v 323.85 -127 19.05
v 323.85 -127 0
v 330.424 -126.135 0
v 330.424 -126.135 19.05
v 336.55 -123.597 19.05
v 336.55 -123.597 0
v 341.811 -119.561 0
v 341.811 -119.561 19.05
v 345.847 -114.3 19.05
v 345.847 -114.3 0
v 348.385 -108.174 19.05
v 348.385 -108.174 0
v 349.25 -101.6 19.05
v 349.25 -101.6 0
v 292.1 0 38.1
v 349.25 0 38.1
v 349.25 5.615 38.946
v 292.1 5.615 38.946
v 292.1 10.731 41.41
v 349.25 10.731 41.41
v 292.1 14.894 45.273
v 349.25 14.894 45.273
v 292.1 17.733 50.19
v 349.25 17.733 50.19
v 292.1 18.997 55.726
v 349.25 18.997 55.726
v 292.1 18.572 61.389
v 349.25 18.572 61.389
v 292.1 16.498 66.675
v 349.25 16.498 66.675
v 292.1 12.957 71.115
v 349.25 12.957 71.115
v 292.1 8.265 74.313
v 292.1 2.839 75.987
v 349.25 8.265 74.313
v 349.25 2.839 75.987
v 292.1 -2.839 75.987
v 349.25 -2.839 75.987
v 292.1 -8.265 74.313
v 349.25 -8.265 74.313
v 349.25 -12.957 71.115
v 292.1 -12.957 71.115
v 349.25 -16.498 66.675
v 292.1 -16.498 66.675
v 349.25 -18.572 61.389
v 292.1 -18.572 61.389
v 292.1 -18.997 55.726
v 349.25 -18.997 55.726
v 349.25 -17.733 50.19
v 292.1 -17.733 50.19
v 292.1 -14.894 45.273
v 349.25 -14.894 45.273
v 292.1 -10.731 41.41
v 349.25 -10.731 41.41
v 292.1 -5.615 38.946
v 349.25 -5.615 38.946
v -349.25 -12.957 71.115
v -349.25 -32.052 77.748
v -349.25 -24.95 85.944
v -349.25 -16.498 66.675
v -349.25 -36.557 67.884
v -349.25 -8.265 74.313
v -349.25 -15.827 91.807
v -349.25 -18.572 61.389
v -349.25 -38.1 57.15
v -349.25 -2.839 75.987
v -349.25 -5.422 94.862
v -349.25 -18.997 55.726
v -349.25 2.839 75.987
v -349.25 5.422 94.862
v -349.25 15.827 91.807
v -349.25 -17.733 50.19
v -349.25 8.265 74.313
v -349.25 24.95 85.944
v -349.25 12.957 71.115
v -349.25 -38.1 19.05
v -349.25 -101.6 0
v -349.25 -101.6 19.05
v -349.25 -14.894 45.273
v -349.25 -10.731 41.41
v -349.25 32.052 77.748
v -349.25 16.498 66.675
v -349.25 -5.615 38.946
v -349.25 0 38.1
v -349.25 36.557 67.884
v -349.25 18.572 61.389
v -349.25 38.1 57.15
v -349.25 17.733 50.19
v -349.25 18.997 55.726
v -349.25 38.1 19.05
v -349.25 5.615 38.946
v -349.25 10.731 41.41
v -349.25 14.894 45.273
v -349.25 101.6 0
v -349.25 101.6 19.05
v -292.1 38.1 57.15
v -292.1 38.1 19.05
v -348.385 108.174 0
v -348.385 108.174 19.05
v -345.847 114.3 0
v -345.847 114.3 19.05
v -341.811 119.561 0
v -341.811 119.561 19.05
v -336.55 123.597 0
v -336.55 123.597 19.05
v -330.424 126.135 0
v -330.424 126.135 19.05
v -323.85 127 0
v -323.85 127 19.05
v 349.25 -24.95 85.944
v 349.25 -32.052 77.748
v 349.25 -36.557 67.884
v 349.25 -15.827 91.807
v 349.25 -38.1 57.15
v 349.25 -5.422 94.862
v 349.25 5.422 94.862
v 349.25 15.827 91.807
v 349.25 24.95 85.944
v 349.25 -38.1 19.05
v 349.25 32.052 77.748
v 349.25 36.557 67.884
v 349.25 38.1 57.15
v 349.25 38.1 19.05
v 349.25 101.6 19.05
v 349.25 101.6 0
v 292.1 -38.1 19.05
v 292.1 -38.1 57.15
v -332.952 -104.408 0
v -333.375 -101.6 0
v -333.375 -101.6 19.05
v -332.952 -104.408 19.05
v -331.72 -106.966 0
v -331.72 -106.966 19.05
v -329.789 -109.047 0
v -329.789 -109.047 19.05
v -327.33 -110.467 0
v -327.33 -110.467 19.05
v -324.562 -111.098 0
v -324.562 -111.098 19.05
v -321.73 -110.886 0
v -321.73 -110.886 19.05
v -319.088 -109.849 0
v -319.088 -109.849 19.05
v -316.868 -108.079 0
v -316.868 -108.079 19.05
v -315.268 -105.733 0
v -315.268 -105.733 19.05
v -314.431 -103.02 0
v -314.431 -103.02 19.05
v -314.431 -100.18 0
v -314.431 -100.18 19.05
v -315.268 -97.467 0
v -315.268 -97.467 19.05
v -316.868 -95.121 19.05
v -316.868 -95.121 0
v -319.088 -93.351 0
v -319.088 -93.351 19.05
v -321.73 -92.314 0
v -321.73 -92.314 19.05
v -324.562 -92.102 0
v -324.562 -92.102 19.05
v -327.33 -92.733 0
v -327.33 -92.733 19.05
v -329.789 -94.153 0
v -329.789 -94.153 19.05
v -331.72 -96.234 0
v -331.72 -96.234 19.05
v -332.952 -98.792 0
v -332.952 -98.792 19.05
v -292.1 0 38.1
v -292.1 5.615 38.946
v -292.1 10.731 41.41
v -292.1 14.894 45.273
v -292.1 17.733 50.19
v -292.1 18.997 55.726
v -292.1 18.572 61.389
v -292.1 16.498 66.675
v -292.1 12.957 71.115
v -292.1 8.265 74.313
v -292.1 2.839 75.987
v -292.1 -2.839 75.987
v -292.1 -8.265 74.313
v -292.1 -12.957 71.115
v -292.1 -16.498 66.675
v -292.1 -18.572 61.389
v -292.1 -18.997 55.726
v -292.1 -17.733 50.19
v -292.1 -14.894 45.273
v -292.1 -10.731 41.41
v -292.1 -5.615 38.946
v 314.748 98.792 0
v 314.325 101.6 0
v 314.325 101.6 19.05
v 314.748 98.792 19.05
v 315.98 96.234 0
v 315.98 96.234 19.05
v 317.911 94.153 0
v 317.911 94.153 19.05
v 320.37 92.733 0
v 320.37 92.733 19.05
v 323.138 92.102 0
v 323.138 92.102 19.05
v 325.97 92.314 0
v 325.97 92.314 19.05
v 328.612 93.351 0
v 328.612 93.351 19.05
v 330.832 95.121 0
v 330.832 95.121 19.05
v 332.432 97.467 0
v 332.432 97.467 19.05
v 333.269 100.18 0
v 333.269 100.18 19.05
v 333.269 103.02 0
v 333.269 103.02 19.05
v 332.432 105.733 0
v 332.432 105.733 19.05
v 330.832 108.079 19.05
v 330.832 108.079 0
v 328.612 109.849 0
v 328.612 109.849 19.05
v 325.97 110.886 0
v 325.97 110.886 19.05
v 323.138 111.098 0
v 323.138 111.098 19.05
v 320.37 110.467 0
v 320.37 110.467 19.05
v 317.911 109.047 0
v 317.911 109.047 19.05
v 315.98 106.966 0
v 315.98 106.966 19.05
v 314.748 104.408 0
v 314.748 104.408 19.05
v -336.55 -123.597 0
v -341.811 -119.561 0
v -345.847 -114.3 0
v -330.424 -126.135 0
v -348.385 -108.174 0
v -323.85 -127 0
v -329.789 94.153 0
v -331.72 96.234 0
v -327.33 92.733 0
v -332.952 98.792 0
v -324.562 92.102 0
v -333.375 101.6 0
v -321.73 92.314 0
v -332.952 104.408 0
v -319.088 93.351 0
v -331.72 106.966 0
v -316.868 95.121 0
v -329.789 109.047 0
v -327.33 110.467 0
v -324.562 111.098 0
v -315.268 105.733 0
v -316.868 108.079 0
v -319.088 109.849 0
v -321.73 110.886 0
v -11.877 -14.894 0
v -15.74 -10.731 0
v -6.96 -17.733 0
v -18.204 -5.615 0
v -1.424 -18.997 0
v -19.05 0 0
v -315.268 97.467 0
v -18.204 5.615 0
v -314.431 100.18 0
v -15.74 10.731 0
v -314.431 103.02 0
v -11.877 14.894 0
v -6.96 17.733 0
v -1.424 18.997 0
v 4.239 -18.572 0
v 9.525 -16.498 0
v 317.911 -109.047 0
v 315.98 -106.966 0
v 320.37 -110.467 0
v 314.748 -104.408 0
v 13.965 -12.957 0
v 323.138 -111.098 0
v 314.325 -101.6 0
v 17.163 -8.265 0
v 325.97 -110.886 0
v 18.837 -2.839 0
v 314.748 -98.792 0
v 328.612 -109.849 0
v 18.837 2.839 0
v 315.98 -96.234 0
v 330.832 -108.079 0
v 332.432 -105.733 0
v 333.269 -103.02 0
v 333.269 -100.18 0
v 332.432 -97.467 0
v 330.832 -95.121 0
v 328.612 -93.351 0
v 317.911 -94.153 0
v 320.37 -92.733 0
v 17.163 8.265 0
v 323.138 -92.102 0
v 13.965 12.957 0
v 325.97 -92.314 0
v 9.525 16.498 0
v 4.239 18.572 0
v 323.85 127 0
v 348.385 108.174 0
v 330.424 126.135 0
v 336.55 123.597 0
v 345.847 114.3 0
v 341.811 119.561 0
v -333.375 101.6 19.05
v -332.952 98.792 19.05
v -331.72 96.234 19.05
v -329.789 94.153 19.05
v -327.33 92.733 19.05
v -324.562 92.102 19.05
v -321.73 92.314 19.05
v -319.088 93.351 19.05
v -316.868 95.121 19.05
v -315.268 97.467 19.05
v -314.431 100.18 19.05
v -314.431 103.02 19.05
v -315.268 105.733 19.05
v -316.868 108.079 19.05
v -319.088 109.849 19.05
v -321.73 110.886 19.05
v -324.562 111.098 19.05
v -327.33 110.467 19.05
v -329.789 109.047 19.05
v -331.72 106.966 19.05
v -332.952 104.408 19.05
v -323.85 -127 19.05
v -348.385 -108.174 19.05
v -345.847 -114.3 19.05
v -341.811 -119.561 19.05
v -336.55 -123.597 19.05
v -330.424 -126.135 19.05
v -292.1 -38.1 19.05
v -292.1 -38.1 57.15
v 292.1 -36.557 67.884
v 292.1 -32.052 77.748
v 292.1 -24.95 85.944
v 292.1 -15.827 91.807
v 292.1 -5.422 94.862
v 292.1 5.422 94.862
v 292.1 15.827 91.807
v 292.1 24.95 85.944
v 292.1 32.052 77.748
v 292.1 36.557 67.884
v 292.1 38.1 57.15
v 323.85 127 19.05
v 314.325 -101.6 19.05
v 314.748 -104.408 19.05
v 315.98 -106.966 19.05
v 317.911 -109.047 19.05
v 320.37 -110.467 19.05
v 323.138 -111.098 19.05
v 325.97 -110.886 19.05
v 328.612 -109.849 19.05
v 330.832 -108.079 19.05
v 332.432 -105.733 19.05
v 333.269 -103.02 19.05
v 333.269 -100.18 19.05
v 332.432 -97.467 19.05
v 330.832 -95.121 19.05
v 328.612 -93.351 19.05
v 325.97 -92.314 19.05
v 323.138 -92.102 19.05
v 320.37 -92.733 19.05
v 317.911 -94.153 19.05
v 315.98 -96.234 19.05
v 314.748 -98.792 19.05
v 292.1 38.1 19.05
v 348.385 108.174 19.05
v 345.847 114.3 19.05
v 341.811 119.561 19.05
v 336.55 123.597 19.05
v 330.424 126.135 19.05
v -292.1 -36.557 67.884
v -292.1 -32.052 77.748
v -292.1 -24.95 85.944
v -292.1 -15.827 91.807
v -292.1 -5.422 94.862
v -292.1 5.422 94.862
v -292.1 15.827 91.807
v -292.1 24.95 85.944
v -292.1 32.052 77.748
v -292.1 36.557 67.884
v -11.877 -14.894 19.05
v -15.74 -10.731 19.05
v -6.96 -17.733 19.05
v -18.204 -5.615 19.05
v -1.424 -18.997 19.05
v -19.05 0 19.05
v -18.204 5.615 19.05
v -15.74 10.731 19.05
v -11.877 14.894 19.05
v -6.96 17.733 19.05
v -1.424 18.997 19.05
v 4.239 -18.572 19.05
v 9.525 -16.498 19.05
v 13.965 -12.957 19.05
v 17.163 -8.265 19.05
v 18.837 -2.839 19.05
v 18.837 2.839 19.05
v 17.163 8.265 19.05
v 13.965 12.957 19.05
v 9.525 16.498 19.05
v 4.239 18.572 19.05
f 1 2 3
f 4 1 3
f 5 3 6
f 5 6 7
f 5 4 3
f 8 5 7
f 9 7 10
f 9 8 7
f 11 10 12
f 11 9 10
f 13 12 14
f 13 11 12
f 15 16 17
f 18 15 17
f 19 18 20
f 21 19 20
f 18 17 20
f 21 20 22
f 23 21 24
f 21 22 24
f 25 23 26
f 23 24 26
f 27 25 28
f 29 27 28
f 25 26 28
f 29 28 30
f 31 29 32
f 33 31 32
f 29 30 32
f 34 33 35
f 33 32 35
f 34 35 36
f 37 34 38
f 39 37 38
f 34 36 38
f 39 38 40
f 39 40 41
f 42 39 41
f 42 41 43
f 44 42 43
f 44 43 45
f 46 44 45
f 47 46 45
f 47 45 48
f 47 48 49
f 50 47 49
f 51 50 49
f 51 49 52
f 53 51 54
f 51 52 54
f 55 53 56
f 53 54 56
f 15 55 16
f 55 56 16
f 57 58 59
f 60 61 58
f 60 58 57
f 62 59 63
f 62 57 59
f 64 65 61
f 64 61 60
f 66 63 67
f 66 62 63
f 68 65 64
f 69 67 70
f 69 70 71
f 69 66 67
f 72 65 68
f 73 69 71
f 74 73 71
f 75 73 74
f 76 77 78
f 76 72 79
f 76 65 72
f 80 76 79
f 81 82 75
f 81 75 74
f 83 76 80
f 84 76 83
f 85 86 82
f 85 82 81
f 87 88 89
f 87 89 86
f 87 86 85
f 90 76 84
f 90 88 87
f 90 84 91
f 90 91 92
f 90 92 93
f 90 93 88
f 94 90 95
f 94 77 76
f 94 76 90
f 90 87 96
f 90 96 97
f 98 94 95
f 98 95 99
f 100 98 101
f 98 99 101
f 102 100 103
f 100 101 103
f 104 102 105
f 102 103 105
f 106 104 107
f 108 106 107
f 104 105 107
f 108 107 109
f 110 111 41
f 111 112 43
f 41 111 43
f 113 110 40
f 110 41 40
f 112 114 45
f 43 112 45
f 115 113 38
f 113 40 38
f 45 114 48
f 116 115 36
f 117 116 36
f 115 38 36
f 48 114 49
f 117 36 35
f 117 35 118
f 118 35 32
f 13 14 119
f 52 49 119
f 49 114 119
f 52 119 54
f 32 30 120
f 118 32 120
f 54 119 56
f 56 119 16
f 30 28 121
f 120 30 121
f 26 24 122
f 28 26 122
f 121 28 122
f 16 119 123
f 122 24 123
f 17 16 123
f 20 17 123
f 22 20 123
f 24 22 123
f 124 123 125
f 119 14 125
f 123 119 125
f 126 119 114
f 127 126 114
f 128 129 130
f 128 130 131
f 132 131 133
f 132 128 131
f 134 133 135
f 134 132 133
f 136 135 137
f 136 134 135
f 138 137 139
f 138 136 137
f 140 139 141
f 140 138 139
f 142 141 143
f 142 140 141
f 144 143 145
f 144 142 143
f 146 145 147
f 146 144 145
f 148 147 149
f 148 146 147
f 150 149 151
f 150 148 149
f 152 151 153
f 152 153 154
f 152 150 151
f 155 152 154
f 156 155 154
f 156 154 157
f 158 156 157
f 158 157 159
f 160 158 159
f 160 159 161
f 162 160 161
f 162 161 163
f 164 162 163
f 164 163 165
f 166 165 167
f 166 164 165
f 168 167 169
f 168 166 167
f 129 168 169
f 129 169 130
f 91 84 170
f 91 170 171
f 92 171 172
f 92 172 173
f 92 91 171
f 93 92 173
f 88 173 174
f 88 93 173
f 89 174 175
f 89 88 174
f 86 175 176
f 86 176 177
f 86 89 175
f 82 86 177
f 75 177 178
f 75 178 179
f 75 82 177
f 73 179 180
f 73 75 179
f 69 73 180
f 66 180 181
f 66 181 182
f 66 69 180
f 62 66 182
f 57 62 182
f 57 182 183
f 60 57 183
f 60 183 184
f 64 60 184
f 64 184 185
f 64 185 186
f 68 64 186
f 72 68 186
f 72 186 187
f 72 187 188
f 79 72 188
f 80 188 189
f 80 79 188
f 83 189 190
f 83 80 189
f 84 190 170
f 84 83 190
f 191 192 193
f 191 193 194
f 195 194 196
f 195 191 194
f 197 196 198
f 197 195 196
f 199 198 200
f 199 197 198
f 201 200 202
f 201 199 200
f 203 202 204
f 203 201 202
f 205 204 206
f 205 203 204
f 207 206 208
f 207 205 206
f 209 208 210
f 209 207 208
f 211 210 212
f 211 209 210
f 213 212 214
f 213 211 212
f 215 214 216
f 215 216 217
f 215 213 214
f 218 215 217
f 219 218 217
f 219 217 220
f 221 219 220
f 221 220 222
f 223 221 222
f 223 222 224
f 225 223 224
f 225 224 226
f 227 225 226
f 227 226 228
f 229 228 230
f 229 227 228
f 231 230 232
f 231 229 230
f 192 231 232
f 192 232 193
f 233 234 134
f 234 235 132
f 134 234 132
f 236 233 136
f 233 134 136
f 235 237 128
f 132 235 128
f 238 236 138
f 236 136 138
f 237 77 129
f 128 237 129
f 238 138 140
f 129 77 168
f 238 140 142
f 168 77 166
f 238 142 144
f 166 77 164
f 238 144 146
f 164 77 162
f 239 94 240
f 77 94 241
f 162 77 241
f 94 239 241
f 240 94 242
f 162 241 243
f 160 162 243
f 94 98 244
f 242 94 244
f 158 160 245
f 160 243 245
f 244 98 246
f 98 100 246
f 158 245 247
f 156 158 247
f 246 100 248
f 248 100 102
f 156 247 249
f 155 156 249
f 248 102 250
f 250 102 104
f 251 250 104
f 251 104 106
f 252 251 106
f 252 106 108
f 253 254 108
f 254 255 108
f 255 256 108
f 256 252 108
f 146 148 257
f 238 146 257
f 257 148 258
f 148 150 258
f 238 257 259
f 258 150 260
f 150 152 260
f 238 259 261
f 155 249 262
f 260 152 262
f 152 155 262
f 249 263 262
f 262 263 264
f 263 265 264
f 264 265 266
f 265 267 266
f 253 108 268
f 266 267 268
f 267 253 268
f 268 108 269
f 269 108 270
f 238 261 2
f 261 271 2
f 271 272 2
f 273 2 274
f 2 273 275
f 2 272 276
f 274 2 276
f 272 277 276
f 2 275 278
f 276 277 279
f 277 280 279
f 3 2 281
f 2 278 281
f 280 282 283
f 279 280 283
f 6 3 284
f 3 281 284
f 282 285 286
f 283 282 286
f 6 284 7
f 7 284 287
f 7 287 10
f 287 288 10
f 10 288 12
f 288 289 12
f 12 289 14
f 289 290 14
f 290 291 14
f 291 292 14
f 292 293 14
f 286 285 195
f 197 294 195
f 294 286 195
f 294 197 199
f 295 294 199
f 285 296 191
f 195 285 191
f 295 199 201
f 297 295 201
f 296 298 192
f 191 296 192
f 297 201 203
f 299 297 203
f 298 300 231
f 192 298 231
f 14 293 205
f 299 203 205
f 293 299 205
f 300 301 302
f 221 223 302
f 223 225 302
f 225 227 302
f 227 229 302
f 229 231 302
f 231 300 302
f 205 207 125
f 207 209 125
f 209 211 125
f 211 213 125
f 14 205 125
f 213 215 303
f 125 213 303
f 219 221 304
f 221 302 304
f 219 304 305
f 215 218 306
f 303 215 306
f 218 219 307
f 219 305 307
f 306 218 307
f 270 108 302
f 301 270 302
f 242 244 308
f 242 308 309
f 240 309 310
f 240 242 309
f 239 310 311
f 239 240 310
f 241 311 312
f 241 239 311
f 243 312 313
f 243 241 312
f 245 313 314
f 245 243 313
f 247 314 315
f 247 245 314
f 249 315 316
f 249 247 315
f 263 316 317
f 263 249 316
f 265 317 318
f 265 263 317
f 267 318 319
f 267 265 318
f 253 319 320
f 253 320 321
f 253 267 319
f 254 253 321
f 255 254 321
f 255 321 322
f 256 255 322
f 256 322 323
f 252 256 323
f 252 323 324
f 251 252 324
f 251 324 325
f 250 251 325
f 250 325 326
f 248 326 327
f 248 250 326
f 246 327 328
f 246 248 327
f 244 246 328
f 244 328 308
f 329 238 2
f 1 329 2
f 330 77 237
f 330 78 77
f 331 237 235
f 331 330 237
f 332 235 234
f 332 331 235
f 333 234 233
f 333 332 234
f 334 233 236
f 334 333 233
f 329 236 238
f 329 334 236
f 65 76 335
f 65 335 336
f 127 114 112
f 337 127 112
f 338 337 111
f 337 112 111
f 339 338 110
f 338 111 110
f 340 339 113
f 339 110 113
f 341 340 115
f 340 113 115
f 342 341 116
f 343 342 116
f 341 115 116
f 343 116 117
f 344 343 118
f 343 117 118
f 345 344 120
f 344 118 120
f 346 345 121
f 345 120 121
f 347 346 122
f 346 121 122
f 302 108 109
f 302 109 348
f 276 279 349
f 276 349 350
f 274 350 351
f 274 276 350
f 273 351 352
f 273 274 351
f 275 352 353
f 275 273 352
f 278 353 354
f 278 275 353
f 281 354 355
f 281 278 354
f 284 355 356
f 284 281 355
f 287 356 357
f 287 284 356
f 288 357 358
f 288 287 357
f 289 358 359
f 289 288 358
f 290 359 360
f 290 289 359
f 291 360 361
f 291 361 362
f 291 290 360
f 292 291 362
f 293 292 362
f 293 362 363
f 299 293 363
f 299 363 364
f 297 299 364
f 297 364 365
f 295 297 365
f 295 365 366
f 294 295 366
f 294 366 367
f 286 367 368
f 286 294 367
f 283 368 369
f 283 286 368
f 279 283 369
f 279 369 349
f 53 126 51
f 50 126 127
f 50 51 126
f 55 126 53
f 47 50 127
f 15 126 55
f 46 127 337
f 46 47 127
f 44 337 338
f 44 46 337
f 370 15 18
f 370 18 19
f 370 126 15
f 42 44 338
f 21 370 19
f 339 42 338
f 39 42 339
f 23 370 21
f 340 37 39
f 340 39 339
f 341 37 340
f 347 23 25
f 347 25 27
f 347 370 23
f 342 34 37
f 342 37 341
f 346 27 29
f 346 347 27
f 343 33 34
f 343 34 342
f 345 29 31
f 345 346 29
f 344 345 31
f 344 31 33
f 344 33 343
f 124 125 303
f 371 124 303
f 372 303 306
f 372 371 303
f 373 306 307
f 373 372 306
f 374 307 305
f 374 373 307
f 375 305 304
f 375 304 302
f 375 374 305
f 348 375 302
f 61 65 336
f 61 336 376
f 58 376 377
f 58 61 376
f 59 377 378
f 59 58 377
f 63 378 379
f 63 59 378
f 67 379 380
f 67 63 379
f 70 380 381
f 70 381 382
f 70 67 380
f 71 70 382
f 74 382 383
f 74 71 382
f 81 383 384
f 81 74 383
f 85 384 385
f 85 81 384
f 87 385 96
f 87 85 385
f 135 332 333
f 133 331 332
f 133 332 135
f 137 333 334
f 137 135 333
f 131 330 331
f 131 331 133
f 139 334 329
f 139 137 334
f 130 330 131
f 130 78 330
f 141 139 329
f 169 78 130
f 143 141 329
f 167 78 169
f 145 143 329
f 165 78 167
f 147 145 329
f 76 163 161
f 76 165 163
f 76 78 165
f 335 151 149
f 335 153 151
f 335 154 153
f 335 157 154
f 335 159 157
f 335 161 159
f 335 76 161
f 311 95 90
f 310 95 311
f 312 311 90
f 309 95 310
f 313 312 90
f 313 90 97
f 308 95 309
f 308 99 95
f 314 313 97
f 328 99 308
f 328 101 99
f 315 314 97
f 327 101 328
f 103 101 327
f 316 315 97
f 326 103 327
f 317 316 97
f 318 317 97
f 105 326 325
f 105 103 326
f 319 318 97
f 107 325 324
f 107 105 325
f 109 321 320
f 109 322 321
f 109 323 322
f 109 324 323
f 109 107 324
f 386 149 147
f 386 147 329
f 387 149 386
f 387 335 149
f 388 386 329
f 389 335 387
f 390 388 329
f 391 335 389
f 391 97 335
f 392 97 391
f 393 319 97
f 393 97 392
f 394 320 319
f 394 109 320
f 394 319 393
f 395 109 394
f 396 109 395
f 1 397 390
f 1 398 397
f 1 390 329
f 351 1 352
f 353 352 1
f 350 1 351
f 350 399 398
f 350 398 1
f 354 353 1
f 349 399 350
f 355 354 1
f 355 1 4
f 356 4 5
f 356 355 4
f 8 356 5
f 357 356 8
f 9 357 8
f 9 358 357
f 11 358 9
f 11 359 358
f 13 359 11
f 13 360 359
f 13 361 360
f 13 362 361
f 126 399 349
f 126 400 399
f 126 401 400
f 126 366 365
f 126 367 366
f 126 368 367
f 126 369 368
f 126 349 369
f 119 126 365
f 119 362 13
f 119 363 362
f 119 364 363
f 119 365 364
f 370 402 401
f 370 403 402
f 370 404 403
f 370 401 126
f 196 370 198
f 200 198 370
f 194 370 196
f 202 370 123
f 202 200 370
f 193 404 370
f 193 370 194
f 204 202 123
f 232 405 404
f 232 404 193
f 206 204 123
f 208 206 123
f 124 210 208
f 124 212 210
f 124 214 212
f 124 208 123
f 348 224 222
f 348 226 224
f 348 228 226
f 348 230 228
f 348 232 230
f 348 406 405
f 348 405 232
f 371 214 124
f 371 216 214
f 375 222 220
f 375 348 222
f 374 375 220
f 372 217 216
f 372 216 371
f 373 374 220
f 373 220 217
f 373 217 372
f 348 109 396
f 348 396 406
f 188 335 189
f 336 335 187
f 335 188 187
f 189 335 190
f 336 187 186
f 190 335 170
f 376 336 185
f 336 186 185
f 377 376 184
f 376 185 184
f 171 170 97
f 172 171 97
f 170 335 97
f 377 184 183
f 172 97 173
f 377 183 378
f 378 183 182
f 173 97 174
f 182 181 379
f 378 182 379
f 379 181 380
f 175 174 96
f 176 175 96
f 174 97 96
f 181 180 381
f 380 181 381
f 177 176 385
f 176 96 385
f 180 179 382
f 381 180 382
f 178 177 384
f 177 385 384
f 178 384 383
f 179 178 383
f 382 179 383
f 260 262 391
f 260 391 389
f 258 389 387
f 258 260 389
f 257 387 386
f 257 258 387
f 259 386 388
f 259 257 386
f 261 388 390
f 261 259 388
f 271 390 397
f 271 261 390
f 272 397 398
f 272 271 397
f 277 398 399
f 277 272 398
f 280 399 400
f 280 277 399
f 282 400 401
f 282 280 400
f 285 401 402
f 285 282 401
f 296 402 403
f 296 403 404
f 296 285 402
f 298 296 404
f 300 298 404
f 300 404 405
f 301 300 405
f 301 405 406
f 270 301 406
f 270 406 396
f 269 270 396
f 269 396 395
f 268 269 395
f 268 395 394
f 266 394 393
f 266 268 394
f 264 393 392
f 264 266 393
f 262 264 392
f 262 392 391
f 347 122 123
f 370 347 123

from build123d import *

# Parameters (mm, degrees)
SKETCH1_W           = 698.5
SKETCH1_H           = 254
SKETCH1_R           = 19.05
SKETCH1_R_2         = 9.525
BOSS_EXTRUDE1_DEPTH = 19.05
FILLET3_R           = 25.4
FILLET4_R           = 25.4
FILLET5_R           = 25.4
FILLET6_R           = 25.4
SKETCH2_R           = 19.05
BOSS_EXTRUDE2_DEPTH = 57.15


with BuildPart() as part:
    # Sketch1 → Boss-Extrude1 (new body)
    with BuildSketch(Plane.XY):
        Rectangle(SKETCH1_W, SKETCH1_H)
        with Locations(Location((0, 0, 0), (0, 0, 180))):
            Circle(SKETCH1_R, mode=Mode.SUBTRACT)
        with Locations(Location((-323.85, 101.6, 0), (0, 0, 180))):
            Circle(SKETCH1_R_2, mode=Mode.SUBTRACT)
        with Locations(Location((323.85, 101.6, 0), (0, 0, 180))):
            Circle(SKETCH1_R_2, mode=Mode.SUBTRACT)
        with Locations(Location((323.85, -101.6, 0), (0, 0, 180))):
            Circle(SKETCH1_R_2, mode=Mode.SUBTRACT)
        with Locations(Location((-323.85, -101.6, 0), (0, 0, 180))):
            Circle(SKETCH1_R_2, mode=Mode.SUBTRACT)
    extrude(amount=BOSS_EXTRUDE1_DEPTH)

    # Fillet3
    fillet3_edges = [part.edges().sort_by_distance(p)[0] for p in [
        (-349.25, 127, 9.525),
    ]]
    fillet(fillet3_edges, radius=FILLET3_R)

    # Fillet4
    fillet4_edges = [part.edges().sort_by_distance(p)[0] for p in [
        (-349.25, -127, 9.525),
    ]]
    fillet(fillet4_edges, radius=FILLET4_R)

    # Fillet5
    fillet5_edges = [part.edges().sort_by_distance(p)[0] for p in [
        (349.25, -127, 9.525),
    ]]
    fillet(fillet5_edges, radius=FILLET5_R)

    # Fillet6
    fillet6_edges = [part.edges().sort_by_distance(p)[0] for p in [
        (349.25, 127, 9.525),
    ]]
    fillet(fillet6_edges, radius=FILLET6_R)

    # Sketch2 → Boss-Extrude2 (add)
    with BuildSketch(Plane(origin=(349.25, 0, 0), x_dir=(0, 0, -1), z_dir=(1, 0, 0))):
        with BuildLine():
            Line((-19.05, 38.1), (-19.05, -38.1))
            Line((-19.05, -38.1), (-57.15, -38.1))
            ThreePointArc((-57.15, -38.1), (-95.25, 0), (-57.15, 38.1))
            Line((-57.15, 38.1), (-19.05, 38.1))
        make_face()
        with Locations((-57.15, 0)):
            Circle(SKETCH2_R, mode=Mode.SUBTRACT)
    boss_extrude2 = extrude(amount=-BOSS_EXTRUDE2_DEPTH)

    # Mirror3: Boss-Extrude2 across plane
    add(boss_extrude2.mirror(Plane.ZY))


solid = part.part
